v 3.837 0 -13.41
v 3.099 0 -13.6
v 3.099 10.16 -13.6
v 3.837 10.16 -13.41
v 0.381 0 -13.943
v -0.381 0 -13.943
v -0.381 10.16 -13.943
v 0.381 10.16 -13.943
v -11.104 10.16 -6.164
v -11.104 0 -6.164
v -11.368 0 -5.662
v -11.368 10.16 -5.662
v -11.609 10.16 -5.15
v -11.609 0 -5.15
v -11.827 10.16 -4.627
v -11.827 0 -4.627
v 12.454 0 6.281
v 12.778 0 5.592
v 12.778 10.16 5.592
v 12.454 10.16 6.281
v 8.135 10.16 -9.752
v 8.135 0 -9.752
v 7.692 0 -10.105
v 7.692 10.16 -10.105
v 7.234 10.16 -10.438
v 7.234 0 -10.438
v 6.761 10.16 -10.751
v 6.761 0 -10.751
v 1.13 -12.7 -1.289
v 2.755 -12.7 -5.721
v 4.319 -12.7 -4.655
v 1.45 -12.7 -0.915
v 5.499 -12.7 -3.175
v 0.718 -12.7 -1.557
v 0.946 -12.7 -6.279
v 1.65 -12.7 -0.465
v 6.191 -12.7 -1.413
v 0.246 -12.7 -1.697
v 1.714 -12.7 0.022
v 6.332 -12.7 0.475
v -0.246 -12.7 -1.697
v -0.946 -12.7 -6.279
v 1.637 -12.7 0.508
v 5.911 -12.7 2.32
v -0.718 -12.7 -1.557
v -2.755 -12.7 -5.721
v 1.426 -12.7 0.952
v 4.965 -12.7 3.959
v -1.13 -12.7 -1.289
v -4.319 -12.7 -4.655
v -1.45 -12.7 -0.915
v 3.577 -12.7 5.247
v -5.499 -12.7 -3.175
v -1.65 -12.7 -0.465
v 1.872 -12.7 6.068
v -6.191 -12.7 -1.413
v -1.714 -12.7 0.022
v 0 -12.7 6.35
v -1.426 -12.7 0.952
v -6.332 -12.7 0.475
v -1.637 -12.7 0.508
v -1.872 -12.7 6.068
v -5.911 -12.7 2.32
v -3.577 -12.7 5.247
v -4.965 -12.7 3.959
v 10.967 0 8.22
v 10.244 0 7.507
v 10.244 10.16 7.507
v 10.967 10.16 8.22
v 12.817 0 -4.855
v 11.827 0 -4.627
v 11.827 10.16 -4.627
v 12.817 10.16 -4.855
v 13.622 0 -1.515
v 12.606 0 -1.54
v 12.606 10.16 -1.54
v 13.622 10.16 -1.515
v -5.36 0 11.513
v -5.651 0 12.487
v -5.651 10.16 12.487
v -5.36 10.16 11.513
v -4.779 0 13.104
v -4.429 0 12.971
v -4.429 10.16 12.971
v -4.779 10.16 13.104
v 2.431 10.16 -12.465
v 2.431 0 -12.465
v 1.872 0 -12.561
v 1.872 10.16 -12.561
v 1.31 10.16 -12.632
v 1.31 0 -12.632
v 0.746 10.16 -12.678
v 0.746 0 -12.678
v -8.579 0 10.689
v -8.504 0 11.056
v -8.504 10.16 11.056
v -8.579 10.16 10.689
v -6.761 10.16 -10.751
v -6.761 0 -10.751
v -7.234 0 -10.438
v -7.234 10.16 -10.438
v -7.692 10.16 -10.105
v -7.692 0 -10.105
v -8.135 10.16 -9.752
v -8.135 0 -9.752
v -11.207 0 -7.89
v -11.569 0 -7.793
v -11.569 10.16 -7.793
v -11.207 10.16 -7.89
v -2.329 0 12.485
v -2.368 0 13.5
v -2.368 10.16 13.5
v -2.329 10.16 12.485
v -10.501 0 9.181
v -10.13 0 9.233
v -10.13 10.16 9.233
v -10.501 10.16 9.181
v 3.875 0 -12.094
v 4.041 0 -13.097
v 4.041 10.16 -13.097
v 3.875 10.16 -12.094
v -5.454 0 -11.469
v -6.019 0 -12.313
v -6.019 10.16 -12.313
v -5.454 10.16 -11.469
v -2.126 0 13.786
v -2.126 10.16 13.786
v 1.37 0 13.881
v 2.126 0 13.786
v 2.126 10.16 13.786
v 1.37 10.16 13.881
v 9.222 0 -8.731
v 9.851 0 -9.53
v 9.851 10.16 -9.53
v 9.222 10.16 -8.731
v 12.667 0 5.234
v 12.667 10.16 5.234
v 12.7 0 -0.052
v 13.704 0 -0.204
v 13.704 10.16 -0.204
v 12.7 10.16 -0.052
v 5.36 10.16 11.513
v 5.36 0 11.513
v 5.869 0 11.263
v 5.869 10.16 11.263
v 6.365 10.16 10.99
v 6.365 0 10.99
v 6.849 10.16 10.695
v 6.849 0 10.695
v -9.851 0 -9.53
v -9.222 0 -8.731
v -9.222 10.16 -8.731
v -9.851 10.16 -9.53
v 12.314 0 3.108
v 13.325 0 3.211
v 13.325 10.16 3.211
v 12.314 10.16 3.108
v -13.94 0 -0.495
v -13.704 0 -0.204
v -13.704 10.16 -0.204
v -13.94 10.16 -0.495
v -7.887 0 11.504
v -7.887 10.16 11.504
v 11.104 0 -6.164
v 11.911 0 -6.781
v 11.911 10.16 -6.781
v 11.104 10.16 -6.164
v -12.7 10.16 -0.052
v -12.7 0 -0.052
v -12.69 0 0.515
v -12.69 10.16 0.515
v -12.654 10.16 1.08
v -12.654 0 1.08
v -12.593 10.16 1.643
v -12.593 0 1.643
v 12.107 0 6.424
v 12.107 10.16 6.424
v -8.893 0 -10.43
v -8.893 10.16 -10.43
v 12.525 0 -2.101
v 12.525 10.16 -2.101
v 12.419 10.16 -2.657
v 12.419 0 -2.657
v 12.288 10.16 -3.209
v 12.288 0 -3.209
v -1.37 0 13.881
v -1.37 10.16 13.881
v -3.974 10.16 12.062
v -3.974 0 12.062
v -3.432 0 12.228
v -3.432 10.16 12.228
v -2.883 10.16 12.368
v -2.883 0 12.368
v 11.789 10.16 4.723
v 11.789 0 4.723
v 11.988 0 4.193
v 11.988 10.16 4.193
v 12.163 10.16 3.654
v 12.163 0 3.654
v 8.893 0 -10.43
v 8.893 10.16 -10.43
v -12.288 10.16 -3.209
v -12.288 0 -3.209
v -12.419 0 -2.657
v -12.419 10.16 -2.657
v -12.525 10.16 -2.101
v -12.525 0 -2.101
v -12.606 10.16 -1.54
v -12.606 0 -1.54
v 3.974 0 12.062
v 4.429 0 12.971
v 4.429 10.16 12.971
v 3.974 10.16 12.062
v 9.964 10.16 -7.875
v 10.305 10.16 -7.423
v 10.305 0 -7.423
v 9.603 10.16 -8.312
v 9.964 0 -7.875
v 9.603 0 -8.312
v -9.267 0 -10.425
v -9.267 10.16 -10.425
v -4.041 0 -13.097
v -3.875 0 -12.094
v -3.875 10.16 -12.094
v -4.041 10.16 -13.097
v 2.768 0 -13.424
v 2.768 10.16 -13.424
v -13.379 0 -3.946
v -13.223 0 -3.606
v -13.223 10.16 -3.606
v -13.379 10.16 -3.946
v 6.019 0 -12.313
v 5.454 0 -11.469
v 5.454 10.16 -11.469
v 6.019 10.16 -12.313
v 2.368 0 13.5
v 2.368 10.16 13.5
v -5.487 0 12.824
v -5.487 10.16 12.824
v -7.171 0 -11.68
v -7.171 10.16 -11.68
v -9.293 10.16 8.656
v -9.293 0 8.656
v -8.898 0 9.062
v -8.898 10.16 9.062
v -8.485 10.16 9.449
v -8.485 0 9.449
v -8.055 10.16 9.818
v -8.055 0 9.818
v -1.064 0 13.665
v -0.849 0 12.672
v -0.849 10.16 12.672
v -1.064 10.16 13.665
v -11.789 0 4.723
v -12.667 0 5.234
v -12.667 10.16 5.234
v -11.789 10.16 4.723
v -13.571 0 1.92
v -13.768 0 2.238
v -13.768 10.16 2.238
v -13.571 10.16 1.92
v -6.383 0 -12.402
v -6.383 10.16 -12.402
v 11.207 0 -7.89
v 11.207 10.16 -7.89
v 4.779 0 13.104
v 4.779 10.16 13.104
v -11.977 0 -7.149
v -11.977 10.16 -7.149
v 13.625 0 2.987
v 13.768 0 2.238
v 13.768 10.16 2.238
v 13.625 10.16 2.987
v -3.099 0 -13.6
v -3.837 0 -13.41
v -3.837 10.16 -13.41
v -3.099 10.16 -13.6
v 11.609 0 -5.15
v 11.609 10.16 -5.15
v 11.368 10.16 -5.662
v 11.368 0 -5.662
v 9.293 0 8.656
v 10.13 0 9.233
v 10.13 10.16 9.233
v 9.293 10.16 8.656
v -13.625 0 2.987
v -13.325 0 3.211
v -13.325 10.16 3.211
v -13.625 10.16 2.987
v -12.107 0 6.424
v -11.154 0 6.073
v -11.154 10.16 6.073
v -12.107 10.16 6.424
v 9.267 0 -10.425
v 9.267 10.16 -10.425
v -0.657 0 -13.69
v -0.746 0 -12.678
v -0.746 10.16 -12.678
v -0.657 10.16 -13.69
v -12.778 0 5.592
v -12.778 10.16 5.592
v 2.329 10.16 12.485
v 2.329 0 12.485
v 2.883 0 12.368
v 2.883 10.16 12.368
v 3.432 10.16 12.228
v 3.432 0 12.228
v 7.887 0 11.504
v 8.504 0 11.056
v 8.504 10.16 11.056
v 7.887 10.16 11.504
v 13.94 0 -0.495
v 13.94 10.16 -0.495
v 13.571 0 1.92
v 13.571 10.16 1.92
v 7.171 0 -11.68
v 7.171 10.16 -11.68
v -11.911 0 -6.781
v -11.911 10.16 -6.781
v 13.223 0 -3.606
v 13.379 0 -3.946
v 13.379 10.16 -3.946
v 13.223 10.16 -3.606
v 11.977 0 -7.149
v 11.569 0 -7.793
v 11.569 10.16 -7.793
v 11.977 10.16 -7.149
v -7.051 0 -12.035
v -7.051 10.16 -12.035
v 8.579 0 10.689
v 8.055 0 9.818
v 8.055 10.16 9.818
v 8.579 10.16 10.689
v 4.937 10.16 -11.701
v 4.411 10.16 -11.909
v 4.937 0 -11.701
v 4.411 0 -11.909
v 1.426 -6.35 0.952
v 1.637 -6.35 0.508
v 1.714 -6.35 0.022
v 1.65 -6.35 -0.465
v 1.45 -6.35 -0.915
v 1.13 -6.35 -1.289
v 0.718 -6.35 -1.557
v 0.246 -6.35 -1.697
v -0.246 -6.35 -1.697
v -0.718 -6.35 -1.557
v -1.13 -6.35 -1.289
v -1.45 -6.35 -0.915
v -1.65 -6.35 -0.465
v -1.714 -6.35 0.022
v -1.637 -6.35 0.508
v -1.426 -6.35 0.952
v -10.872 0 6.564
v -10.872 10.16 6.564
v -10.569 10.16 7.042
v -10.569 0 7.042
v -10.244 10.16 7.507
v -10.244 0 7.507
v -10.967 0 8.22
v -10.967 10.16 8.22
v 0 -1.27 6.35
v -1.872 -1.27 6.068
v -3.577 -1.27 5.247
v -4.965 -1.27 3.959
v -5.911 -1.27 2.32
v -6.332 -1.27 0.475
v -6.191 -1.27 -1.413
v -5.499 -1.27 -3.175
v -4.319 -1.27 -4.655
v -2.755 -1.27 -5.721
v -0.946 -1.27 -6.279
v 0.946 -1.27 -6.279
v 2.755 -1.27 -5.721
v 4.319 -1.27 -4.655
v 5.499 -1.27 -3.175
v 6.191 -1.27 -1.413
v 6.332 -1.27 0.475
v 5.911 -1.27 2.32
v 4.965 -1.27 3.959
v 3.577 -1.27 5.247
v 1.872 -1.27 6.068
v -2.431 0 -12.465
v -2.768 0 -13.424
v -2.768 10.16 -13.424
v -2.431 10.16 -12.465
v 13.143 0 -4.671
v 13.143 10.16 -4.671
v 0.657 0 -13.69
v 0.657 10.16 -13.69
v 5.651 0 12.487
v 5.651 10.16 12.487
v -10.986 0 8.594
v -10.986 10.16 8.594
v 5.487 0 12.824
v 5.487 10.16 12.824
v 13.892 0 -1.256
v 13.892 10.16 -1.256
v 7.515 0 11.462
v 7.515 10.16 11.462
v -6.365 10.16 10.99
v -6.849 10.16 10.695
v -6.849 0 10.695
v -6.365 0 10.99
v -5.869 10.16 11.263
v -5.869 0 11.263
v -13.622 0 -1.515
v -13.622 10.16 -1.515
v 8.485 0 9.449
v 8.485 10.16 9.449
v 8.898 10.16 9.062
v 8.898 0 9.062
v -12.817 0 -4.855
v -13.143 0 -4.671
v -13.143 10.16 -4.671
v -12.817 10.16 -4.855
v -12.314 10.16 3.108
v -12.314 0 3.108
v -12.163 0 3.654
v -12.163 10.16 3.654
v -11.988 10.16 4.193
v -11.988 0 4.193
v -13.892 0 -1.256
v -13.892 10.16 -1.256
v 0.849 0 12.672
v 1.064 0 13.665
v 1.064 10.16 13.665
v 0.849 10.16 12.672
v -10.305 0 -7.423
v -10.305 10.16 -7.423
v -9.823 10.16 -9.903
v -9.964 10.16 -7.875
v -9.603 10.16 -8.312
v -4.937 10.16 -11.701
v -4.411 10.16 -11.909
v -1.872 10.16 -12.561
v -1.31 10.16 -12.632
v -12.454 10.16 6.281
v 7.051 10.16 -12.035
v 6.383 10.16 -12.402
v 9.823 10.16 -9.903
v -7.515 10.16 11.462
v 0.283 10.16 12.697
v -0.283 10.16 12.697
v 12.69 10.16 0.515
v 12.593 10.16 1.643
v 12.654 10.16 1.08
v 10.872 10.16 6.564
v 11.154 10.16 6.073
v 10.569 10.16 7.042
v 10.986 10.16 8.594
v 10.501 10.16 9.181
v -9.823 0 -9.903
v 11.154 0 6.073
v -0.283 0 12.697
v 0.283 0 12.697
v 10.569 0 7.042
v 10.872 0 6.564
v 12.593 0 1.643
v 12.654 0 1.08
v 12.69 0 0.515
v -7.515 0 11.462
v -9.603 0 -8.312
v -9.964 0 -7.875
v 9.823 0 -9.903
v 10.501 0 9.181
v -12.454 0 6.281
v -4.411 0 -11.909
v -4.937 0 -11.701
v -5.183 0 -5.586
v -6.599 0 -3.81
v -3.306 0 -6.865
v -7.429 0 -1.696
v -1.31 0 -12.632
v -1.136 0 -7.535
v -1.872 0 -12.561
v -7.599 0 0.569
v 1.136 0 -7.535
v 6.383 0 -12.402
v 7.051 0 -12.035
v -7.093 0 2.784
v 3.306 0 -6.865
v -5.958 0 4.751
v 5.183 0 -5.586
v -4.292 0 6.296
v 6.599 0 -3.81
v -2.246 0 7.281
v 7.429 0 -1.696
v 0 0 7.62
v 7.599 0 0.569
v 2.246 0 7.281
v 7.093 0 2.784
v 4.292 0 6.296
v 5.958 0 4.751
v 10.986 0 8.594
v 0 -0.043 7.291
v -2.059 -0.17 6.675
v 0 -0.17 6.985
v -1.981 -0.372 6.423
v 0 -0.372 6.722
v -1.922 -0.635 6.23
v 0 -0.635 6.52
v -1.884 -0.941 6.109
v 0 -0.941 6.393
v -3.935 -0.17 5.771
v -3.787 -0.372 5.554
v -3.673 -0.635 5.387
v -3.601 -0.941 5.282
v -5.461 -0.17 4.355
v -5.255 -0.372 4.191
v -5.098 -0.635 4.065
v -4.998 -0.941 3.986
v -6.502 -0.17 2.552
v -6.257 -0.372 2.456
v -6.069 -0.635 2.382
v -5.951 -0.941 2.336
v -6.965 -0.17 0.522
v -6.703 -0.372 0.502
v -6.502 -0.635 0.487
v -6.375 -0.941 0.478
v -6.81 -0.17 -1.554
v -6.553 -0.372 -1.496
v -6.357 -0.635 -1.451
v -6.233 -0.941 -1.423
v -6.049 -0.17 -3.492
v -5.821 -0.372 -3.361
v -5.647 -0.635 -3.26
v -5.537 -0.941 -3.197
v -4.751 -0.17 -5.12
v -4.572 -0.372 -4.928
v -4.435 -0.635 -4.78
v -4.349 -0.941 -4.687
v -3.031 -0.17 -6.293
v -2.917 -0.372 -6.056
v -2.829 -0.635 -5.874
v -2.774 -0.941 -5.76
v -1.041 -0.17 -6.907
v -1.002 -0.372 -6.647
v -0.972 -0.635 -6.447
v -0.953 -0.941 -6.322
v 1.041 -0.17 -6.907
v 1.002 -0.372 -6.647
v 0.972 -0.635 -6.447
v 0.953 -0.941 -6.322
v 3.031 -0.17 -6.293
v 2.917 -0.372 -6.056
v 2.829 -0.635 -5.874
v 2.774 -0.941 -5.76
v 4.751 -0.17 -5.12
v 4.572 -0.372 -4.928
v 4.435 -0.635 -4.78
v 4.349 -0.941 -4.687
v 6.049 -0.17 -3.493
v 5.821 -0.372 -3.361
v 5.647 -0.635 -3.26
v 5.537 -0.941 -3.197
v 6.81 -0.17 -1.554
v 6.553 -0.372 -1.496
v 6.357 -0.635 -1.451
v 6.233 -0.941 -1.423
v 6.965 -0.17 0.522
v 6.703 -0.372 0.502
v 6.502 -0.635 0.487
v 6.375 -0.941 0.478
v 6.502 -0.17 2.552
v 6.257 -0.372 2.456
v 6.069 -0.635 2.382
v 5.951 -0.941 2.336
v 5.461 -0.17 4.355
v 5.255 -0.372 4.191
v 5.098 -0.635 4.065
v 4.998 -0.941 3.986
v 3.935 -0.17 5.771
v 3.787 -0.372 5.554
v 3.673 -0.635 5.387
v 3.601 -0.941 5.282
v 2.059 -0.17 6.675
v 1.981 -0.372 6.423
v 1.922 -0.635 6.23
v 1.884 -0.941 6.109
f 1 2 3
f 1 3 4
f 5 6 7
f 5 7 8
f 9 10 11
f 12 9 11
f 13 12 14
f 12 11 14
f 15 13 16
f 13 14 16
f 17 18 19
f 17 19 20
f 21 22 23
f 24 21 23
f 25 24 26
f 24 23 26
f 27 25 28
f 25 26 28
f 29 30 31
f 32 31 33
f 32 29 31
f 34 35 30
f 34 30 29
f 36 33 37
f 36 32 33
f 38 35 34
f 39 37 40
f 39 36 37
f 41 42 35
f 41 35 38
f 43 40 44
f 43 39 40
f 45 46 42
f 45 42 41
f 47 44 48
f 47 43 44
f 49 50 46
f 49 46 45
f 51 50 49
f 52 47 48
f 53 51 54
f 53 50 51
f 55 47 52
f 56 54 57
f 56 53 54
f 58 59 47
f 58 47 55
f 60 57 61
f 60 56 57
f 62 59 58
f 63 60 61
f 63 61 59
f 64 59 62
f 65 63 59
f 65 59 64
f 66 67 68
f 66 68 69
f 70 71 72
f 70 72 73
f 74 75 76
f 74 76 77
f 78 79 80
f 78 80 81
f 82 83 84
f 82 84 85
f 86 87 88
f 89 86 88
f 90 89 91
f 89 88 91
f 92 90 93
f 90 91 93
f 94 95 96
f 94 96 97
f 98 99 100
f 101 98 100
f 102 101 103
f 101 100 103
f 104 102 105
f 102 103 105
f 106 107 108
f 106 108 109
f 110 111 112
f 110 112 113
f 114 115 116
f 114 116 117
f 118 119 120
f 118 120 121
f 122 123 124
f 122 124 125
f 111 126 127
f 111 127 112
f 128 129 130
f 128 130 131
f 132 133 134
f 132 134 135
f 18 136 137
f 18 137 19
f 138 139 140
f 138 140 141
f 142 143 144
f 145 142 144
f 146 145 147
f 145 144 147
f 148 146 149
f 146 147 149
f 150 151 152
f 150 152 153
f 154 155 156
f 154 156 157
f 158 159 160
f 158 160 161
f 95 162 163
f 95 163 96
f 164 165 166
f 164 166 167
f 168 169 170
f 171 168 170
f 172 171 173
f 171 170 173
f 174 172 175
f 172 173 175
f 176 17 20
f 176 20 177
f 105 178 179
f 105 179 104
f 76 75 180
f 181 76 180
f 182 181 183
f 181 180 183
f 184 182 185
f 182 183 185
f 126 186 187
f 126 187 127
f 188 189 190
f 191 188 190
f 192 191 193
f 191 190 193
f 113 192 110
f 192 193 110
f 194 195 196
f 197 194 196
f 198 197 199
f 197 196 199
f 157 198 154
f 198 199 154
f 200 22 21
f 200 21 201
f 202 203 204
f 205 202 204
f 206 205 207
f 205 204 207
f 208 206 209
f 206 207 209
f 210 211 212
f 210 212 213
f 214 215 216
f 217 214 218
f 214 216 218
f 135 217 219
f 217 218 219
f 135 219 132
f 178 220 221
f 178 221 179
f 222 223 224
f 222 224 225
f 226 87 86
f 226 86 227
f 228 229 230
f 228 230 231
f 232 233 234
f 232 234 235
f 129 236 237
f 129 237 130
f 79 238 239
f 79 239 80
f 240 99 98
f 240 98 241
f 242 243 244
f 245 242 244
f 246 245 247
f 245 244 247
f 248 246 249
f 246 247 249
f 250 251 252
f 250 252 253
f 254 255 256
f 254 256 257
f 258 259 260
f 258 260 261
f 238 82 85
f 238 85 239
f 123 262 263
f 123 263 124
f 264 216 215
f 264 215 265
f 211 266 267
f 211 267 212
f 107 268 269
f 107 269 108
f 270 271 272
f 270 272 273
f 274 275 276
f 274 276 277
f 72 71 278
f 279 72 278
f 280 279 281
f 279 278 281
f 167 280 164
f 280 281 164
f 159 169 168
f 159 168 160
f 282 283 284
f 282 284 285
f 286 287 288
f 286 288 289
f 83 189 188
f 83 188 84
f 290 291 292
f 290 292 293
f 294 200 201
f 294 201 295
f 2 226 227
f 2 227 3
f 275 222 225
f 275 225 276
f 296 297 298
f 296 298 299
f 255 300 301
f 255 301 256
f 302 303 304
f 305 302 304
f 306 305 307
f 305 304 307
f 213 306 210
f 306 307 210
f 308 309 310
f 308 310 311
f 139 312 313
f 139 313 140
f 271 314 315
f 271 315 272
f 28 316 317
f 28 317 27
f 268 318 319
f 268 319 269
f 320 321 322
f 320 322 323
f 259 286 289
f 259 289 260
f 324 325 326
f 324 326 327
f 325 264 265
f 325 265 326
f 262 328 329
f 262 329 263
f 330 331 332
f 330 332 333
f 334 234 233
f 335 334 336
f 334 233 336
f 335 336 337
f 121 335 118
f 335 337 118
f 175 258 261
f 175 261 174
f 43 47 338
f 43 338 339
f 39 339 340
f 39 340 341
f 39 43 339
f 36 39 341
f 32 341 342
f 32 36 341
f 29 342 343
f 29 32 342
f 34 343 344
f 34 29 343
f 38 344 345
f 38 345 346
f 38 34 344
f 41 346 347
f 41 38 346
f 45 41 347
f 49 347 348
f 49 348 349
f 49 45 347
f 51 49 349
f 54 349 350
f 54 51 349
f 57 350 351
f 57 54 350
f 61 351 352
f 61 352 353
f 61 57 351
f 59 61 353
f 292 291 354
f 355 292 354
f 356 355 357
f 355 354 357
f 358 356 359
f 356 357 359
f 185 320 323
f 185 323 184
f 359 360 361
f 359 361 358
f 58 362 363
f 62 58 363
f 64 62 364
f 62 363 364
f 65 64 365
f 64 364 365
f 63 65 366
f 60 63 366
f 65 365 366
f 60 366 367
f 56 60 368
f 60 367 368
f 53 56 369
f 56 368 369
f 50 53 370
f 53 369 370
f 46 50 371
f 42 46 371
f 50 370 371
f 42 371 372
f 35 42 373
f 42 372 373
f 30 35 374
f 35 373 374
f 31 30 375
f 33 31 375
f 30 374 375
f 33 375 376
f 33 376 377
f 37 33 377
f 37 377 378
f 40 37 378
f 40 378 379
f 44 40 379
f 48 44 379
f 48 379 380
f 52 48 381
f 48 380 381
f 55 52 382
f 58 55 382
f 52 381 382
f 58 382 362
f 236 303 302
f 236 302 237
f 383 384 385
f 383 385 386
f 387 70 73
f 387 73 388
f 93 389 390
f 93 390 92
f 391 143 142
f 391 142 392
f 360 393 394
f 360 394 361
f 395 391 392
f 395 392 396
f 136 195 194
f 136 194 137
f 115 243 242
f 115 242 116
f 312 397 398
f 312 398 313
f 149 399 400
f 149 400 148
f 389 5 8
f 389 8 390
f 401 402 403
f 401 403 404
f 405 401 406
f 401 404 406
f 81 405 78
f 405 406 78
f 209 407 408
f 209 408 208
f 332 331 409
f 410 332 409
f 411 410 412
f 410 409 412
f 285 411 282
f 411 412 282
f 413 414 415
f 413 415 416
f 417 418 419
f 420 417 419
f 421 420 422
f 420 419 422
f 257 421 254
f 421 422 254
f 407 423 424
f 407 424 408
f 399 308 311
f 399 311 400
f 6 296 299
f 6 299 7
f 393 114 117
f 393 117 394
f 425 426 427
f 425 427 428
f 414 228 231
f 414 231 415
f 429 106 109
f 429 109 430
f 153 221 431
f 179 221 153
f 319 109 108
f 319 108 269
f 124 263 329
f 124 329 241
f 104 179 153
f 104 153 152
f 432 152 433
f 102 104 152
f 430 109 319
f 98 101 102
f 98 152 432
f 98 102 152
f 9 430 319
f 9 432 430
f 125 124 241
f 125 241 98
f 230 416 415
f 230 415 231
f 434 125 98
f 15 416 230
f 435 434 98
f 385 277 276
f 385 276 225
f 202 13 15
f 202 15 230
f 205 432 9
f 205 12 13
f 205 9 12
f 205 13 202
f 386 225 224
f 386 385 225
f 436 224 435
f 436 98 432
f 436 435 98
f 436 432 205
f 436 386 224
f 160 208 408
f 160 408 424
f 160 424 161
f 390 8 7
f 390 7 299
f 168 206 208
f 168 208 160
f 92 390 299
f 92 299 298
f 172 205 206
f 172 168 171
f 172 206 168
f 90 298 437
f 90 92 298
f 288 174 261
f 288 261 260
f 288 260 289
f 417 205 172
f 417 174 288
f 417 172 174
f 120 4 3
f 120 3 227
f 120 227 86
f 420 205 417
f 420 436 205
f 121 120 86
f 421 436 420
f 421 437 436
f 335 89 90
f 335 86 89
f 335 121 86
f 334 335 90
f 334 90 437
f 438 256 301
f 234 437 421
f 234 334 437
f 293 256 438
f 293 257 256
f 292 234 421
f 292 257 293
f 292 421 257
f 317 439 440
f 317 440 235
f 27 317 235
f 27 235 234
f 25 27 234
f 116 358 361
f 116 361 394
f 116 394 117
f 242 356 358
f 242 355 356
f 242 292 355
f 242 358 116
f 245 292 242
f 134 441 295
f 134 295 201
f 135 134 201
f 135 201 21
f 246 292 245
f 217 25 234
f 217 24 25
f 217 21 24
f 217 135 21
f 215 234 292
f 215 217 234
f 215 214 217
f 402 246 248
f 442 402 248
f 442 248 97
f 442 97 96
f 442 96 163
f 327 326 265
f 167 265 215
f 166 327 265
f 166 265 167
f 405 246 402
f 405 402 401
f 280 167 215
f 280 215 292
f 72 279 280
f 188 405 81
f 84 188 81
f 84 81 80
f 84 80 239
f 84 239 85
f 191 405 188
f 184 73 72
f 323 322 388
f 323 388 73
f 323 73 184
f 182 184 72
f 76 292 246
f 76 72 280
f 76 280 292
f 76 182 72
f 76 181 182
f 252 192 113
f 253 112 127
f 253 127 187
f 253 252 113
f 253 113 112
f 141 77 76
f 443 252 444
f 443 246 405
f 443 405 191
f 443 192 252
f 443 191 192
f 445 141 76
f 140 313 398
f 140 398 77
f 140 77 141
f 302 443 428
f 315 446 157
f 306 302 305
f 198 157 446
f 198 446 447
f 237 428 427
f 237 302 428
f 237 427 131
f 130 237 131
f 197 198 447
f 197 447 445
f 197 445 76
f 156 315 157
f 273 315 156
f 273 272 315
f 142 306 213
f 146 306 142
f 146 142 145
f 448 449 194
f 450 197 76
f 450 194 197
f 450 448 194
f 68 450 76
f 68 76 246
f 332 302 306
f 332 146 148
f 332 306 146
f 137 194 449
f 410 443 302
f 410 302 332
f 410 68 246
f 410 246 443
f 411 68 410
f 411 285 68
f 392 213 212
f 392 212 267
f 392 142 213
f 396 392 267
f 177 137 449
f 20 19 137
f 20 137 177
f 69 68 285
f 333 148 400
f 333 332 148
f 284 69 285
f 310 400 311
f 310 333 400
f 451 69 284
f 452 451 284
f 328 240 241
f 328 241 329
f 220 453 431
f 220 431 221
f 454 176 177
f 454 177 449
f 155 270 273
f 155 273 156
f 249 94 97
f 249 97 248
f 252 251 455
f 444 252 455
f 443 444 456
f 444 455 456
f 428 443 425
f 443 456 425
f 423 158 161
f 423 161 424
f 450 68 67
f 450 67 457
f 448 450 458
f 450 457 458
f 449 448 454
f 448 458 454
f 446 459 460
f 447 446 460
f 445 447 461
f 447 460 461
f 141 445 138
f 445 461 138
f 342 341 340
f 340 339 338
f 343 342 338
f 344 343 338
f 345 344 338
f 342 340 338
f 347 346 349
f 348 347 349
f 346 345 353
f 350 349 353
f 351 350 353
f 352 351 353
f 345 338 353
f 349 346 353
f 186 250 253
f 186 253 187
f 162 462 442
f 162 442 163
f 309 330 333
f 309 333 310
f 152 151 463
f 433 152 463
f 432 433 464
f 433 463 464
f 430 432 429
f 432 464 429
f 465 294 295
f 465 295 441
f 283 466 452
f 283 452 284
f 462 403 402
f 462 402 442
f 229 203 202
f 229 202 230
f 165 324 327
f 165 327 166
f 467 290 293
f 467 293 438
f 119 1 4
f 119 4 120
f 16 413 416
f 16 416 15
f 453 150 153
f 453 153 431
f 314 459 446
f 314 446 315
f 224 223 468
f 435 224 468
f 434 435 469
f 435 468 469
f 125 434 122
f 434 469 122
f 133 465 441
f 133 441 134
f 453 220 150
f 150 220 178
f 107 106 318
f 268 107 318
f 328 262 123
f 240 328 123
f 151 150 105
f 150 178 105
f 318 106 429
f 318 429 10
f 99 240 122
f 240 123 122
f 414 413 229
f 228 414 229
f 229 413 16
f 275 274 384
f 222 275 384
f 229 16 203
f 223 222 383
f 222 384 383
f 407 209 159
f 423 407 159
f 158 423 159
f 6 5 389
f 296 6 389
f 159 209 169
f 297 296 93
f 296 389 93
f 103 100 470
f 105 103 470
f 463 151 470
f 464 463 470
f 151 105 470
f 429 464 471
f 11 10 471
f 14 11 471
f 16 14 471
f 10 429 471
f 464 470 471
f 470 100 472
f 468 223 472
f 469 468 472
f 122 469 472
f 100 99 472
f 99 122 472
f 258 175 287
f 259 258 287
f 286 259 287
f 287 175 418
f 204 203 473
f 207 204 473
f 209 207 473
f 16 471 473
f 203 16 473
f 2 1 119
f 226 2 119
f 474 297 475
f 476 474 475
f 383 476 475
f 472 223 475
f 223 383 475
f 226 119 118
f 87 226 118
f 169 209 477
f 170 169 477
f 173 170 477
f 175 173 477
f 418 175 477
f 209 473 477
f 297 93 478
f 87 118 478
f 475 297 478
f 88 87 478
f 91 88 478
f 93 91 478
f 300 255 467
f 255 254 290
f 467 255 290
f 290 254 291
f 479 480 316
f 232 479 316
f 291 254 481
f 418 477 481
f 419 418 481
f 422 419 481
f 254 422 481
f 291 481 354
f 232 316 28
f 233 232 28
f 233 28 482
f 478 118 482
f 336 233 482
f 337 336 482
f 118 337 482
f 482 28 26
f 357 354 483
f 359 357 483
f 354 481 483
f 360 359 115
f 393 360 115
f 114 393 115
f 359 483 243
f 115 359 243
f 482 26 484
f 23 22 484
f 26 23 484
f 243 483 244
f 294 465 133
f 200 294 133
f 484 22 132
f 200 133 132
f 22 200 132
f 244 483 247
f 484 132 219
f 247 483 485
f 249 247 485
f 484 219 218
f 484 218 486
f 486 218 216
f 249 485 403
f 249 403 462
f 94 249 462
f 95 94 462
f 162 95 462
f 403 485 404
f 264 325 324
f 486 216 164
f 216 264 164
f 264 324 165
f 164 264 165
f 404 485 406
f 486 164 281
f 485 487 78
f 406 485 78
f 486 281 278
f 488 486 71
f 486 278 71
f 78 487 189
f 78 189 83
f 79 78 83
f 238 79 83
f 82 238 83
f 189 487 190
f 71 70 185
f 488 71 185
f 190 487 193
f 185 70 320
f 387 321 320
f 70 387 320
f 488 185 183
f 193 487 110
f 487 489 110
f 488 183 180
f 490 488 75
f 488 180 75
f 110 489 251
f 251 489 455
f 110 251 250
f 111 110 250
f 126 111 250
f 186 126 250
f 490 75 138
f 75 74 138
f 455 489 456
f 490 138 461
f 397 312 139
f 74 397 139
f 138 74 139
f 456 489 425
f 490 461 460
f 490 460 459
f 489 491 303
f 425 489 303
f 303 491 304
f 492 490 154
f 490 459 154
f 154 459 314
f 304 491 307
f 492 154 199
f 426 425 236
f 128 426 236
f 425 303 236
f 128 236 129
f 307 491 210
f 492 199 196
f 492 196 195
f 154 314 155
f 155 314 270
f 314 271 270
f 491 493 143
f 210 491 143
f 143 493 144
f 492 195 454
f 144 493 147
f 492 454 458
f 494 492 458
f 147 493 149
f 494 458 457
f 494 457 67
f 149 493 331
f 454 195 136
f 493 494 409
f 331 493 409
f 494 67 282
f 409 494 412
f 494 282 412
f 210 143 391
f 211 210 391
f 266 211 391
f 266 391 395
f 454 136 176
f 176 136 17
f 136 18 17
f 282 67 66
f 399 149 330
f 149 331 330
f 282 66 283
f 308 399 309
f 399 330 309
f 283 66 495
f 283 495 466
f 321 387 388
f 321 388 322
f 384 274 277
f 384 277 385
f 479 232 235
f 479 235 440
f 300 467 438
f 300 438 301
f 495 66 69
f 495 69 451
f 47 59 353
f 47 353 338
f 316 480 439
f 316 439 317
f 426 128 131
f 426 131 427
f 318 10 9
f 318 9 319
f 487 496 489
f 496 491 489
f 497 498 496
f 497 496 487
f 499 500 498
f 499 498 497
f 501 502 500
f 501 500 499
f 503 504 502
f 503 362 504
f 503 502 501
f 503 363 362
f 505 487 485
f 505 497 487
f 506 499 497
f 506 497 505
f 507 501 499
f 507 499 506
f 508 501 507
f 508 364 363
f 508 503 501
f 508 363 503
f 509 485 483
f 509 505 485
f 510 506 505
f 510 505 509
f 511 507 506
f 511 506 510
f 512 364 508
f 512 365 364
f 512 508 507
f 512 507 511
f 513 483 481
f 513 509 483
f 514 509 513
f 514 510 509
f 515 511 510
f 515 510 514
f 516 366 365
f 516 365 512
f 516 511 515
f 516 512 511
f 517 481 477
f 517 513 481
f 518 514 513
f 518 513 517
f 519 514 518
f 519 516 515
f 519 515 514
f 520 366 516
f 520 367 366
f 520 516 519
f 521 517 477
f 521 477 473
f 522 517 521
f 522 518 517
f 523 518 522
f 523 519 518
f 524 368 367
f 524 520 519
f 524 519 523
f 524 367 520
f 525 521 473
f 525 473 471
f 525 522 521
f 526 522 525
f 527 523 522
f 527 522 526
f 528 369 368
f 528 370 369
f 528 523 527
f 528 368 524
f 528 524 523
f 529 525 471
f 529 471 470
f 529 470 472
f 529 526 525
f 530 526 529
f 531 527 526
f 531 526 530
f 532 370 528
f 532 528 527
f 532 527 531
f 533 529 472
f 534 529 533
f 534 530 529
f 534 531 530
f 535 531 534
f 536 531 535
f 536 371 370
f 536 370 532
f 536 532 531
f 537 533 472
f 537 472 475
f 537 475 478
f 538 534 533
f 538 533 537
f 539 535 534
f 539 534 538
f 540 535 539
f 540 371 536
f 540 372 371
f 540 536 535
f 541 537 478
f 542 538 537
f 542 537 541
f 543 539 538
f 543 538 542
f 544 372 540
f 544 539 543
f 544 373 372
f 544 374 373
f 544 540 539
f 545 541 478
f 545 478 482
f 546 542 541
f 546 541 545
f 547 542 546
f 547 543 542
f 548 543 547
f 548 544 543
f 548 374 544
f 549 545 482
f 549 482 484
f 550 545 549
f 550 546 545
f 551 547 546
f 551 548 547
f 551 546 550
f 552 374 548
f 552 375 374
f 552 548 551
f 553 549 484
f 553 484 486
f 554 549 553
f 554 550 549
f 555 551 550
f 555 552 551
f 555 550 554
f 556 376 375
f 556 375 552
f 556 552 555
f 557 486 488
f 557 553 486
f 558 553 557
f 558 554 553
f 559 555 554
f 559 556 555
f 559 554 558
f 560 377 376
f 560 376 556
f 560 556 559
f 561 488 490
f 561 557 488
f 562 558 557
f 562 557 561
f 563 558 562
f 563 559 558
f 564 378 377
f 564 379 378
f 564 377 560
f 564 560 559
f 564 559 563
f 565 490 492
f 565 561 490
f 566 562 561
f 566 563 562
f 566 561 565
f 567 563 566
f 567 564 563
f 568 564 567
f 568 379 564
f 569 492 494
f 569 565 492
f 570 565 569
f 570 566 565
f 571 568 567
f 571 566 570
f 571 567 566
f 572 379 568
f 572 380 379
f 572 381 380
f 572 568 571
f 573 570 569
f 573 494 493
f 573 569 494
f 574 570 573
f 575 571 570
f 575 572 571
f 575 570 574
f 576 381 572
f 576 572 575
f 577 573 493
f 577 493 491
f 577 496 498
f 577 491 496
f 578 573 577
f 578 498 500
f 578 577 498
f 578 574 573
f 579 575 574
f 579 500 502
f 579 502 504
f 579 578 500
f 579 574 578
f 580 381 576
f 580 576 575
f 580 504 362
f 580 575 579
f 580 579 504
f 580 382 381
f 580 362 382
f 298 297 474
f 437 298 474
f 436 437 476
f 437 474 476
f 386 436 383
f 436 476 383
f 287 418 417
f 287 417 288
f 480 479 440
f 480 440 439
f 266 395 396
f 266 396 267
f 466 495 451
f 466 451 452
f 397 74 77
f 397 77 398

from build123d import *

# Parameters (mm, degrees)
SKETCH1_R           = 12.7
BOSS_EXTRUDE1_DEPTH = 10.16
BOSS_EXTRUDE2_START = -10.16
BOSS_EXTRUDE2_DEPTH = 10.16
CIRPATTERN1_COUNT   = 25
SKETCH3_R           = 6.35
BOSS_EXTRUDE3_DEPTH = 12.7
CUT_EXTRUDE1_DEPTH  = 6.35
FILLET1_R           = 1.27


with BuildPart() as part:
    # Sketch1 → Boss-Extrude1 (new body)
    with BuildSketch(Plane(origin=(0, 0, 0), x_dir=(1, 0, 0), z_dir=(0, 1, 0))):
        with Locations(Location((0, 0, 0), (0, 0, 270))):
            Circle(SKETCH1_R)
    extrude(amount=BOSS_EXTRUDE1_DEPTH)

    # Sketch2 → Boss-Extrude2 (add)
    with BuildSketch(Plane(origin=(0, 10.16, 0), x_dir=(1, 0, 0), z_dir=(0, 1, 0)).offset(BOSS_EXTRUDE2_START)):
        with BuildLine():
            Line((-0.745687793, 12.678089356), (-0.657137559, 13.690223169))
            Line((-0.657137559, 13.690223169), (-0.381, 13.943256622))
            Line((-0.381, 13.943256622), (0.381, 13.943256622))
            Line((0.381, 13.943256622), (0.657137559, 13.690223169))
            Line((0.657137559, 13.690223169), (0.745687793, 12.678089356))
            ThreePointArc((0.745687793, 12.678089356), (0, 12.7), (-0.745687793, 12.678089356))
        make_face()
    boss_extrude2 = extrude(amount=BOSS_EXTRUDE2_DEPTH)

    # CirPattern1: Boss-Extrude2 ×25 about axis
    cirpattern1_axis = Axis((0, 0, 0), (0, 1, 0))
    for i in range(1, CIRPATTERN1_COUNT):
        add(boss_extrude2.rotate(cirpattern1_axis, i * 360 / CIRPATTERN1_COUNT))

    # Sketch3 → Boss-Extrude3 (add)
    with BuildSketch(Plane.XZ):
        with Locations(Location((0, 0, 0), (0, 0, 90))):
            Circle(SKETCH3_R)
    extrude(amount=BOSS_EXTRUDE3_DEPTH)

    # Sketch4 → Cut-Extrude1 (cut)
    with BuildSketch(Plane.XZ.offset(12.7)):
        with BuildLine():
            Line((-1.425571464, 0.9525), (1.425571464, 0.9525))
            ThreePointArc((1.425571464, 0.9525), (0, -1.7145), (-1.425571464, 0.9525))
        make_face()
    extrude(amount=-CUT_EXTRUDE1_DEPTH, mode=Mode.SUBTRACT)

    # Fillet1
    fillet1_edges = [part.edges().sort_by_distance(p)[0] for p in [
        (0, 0, -6.35),
    ]]
    fillet(fillet1_edges, radius=FILLET1_R)


solid = part.part
